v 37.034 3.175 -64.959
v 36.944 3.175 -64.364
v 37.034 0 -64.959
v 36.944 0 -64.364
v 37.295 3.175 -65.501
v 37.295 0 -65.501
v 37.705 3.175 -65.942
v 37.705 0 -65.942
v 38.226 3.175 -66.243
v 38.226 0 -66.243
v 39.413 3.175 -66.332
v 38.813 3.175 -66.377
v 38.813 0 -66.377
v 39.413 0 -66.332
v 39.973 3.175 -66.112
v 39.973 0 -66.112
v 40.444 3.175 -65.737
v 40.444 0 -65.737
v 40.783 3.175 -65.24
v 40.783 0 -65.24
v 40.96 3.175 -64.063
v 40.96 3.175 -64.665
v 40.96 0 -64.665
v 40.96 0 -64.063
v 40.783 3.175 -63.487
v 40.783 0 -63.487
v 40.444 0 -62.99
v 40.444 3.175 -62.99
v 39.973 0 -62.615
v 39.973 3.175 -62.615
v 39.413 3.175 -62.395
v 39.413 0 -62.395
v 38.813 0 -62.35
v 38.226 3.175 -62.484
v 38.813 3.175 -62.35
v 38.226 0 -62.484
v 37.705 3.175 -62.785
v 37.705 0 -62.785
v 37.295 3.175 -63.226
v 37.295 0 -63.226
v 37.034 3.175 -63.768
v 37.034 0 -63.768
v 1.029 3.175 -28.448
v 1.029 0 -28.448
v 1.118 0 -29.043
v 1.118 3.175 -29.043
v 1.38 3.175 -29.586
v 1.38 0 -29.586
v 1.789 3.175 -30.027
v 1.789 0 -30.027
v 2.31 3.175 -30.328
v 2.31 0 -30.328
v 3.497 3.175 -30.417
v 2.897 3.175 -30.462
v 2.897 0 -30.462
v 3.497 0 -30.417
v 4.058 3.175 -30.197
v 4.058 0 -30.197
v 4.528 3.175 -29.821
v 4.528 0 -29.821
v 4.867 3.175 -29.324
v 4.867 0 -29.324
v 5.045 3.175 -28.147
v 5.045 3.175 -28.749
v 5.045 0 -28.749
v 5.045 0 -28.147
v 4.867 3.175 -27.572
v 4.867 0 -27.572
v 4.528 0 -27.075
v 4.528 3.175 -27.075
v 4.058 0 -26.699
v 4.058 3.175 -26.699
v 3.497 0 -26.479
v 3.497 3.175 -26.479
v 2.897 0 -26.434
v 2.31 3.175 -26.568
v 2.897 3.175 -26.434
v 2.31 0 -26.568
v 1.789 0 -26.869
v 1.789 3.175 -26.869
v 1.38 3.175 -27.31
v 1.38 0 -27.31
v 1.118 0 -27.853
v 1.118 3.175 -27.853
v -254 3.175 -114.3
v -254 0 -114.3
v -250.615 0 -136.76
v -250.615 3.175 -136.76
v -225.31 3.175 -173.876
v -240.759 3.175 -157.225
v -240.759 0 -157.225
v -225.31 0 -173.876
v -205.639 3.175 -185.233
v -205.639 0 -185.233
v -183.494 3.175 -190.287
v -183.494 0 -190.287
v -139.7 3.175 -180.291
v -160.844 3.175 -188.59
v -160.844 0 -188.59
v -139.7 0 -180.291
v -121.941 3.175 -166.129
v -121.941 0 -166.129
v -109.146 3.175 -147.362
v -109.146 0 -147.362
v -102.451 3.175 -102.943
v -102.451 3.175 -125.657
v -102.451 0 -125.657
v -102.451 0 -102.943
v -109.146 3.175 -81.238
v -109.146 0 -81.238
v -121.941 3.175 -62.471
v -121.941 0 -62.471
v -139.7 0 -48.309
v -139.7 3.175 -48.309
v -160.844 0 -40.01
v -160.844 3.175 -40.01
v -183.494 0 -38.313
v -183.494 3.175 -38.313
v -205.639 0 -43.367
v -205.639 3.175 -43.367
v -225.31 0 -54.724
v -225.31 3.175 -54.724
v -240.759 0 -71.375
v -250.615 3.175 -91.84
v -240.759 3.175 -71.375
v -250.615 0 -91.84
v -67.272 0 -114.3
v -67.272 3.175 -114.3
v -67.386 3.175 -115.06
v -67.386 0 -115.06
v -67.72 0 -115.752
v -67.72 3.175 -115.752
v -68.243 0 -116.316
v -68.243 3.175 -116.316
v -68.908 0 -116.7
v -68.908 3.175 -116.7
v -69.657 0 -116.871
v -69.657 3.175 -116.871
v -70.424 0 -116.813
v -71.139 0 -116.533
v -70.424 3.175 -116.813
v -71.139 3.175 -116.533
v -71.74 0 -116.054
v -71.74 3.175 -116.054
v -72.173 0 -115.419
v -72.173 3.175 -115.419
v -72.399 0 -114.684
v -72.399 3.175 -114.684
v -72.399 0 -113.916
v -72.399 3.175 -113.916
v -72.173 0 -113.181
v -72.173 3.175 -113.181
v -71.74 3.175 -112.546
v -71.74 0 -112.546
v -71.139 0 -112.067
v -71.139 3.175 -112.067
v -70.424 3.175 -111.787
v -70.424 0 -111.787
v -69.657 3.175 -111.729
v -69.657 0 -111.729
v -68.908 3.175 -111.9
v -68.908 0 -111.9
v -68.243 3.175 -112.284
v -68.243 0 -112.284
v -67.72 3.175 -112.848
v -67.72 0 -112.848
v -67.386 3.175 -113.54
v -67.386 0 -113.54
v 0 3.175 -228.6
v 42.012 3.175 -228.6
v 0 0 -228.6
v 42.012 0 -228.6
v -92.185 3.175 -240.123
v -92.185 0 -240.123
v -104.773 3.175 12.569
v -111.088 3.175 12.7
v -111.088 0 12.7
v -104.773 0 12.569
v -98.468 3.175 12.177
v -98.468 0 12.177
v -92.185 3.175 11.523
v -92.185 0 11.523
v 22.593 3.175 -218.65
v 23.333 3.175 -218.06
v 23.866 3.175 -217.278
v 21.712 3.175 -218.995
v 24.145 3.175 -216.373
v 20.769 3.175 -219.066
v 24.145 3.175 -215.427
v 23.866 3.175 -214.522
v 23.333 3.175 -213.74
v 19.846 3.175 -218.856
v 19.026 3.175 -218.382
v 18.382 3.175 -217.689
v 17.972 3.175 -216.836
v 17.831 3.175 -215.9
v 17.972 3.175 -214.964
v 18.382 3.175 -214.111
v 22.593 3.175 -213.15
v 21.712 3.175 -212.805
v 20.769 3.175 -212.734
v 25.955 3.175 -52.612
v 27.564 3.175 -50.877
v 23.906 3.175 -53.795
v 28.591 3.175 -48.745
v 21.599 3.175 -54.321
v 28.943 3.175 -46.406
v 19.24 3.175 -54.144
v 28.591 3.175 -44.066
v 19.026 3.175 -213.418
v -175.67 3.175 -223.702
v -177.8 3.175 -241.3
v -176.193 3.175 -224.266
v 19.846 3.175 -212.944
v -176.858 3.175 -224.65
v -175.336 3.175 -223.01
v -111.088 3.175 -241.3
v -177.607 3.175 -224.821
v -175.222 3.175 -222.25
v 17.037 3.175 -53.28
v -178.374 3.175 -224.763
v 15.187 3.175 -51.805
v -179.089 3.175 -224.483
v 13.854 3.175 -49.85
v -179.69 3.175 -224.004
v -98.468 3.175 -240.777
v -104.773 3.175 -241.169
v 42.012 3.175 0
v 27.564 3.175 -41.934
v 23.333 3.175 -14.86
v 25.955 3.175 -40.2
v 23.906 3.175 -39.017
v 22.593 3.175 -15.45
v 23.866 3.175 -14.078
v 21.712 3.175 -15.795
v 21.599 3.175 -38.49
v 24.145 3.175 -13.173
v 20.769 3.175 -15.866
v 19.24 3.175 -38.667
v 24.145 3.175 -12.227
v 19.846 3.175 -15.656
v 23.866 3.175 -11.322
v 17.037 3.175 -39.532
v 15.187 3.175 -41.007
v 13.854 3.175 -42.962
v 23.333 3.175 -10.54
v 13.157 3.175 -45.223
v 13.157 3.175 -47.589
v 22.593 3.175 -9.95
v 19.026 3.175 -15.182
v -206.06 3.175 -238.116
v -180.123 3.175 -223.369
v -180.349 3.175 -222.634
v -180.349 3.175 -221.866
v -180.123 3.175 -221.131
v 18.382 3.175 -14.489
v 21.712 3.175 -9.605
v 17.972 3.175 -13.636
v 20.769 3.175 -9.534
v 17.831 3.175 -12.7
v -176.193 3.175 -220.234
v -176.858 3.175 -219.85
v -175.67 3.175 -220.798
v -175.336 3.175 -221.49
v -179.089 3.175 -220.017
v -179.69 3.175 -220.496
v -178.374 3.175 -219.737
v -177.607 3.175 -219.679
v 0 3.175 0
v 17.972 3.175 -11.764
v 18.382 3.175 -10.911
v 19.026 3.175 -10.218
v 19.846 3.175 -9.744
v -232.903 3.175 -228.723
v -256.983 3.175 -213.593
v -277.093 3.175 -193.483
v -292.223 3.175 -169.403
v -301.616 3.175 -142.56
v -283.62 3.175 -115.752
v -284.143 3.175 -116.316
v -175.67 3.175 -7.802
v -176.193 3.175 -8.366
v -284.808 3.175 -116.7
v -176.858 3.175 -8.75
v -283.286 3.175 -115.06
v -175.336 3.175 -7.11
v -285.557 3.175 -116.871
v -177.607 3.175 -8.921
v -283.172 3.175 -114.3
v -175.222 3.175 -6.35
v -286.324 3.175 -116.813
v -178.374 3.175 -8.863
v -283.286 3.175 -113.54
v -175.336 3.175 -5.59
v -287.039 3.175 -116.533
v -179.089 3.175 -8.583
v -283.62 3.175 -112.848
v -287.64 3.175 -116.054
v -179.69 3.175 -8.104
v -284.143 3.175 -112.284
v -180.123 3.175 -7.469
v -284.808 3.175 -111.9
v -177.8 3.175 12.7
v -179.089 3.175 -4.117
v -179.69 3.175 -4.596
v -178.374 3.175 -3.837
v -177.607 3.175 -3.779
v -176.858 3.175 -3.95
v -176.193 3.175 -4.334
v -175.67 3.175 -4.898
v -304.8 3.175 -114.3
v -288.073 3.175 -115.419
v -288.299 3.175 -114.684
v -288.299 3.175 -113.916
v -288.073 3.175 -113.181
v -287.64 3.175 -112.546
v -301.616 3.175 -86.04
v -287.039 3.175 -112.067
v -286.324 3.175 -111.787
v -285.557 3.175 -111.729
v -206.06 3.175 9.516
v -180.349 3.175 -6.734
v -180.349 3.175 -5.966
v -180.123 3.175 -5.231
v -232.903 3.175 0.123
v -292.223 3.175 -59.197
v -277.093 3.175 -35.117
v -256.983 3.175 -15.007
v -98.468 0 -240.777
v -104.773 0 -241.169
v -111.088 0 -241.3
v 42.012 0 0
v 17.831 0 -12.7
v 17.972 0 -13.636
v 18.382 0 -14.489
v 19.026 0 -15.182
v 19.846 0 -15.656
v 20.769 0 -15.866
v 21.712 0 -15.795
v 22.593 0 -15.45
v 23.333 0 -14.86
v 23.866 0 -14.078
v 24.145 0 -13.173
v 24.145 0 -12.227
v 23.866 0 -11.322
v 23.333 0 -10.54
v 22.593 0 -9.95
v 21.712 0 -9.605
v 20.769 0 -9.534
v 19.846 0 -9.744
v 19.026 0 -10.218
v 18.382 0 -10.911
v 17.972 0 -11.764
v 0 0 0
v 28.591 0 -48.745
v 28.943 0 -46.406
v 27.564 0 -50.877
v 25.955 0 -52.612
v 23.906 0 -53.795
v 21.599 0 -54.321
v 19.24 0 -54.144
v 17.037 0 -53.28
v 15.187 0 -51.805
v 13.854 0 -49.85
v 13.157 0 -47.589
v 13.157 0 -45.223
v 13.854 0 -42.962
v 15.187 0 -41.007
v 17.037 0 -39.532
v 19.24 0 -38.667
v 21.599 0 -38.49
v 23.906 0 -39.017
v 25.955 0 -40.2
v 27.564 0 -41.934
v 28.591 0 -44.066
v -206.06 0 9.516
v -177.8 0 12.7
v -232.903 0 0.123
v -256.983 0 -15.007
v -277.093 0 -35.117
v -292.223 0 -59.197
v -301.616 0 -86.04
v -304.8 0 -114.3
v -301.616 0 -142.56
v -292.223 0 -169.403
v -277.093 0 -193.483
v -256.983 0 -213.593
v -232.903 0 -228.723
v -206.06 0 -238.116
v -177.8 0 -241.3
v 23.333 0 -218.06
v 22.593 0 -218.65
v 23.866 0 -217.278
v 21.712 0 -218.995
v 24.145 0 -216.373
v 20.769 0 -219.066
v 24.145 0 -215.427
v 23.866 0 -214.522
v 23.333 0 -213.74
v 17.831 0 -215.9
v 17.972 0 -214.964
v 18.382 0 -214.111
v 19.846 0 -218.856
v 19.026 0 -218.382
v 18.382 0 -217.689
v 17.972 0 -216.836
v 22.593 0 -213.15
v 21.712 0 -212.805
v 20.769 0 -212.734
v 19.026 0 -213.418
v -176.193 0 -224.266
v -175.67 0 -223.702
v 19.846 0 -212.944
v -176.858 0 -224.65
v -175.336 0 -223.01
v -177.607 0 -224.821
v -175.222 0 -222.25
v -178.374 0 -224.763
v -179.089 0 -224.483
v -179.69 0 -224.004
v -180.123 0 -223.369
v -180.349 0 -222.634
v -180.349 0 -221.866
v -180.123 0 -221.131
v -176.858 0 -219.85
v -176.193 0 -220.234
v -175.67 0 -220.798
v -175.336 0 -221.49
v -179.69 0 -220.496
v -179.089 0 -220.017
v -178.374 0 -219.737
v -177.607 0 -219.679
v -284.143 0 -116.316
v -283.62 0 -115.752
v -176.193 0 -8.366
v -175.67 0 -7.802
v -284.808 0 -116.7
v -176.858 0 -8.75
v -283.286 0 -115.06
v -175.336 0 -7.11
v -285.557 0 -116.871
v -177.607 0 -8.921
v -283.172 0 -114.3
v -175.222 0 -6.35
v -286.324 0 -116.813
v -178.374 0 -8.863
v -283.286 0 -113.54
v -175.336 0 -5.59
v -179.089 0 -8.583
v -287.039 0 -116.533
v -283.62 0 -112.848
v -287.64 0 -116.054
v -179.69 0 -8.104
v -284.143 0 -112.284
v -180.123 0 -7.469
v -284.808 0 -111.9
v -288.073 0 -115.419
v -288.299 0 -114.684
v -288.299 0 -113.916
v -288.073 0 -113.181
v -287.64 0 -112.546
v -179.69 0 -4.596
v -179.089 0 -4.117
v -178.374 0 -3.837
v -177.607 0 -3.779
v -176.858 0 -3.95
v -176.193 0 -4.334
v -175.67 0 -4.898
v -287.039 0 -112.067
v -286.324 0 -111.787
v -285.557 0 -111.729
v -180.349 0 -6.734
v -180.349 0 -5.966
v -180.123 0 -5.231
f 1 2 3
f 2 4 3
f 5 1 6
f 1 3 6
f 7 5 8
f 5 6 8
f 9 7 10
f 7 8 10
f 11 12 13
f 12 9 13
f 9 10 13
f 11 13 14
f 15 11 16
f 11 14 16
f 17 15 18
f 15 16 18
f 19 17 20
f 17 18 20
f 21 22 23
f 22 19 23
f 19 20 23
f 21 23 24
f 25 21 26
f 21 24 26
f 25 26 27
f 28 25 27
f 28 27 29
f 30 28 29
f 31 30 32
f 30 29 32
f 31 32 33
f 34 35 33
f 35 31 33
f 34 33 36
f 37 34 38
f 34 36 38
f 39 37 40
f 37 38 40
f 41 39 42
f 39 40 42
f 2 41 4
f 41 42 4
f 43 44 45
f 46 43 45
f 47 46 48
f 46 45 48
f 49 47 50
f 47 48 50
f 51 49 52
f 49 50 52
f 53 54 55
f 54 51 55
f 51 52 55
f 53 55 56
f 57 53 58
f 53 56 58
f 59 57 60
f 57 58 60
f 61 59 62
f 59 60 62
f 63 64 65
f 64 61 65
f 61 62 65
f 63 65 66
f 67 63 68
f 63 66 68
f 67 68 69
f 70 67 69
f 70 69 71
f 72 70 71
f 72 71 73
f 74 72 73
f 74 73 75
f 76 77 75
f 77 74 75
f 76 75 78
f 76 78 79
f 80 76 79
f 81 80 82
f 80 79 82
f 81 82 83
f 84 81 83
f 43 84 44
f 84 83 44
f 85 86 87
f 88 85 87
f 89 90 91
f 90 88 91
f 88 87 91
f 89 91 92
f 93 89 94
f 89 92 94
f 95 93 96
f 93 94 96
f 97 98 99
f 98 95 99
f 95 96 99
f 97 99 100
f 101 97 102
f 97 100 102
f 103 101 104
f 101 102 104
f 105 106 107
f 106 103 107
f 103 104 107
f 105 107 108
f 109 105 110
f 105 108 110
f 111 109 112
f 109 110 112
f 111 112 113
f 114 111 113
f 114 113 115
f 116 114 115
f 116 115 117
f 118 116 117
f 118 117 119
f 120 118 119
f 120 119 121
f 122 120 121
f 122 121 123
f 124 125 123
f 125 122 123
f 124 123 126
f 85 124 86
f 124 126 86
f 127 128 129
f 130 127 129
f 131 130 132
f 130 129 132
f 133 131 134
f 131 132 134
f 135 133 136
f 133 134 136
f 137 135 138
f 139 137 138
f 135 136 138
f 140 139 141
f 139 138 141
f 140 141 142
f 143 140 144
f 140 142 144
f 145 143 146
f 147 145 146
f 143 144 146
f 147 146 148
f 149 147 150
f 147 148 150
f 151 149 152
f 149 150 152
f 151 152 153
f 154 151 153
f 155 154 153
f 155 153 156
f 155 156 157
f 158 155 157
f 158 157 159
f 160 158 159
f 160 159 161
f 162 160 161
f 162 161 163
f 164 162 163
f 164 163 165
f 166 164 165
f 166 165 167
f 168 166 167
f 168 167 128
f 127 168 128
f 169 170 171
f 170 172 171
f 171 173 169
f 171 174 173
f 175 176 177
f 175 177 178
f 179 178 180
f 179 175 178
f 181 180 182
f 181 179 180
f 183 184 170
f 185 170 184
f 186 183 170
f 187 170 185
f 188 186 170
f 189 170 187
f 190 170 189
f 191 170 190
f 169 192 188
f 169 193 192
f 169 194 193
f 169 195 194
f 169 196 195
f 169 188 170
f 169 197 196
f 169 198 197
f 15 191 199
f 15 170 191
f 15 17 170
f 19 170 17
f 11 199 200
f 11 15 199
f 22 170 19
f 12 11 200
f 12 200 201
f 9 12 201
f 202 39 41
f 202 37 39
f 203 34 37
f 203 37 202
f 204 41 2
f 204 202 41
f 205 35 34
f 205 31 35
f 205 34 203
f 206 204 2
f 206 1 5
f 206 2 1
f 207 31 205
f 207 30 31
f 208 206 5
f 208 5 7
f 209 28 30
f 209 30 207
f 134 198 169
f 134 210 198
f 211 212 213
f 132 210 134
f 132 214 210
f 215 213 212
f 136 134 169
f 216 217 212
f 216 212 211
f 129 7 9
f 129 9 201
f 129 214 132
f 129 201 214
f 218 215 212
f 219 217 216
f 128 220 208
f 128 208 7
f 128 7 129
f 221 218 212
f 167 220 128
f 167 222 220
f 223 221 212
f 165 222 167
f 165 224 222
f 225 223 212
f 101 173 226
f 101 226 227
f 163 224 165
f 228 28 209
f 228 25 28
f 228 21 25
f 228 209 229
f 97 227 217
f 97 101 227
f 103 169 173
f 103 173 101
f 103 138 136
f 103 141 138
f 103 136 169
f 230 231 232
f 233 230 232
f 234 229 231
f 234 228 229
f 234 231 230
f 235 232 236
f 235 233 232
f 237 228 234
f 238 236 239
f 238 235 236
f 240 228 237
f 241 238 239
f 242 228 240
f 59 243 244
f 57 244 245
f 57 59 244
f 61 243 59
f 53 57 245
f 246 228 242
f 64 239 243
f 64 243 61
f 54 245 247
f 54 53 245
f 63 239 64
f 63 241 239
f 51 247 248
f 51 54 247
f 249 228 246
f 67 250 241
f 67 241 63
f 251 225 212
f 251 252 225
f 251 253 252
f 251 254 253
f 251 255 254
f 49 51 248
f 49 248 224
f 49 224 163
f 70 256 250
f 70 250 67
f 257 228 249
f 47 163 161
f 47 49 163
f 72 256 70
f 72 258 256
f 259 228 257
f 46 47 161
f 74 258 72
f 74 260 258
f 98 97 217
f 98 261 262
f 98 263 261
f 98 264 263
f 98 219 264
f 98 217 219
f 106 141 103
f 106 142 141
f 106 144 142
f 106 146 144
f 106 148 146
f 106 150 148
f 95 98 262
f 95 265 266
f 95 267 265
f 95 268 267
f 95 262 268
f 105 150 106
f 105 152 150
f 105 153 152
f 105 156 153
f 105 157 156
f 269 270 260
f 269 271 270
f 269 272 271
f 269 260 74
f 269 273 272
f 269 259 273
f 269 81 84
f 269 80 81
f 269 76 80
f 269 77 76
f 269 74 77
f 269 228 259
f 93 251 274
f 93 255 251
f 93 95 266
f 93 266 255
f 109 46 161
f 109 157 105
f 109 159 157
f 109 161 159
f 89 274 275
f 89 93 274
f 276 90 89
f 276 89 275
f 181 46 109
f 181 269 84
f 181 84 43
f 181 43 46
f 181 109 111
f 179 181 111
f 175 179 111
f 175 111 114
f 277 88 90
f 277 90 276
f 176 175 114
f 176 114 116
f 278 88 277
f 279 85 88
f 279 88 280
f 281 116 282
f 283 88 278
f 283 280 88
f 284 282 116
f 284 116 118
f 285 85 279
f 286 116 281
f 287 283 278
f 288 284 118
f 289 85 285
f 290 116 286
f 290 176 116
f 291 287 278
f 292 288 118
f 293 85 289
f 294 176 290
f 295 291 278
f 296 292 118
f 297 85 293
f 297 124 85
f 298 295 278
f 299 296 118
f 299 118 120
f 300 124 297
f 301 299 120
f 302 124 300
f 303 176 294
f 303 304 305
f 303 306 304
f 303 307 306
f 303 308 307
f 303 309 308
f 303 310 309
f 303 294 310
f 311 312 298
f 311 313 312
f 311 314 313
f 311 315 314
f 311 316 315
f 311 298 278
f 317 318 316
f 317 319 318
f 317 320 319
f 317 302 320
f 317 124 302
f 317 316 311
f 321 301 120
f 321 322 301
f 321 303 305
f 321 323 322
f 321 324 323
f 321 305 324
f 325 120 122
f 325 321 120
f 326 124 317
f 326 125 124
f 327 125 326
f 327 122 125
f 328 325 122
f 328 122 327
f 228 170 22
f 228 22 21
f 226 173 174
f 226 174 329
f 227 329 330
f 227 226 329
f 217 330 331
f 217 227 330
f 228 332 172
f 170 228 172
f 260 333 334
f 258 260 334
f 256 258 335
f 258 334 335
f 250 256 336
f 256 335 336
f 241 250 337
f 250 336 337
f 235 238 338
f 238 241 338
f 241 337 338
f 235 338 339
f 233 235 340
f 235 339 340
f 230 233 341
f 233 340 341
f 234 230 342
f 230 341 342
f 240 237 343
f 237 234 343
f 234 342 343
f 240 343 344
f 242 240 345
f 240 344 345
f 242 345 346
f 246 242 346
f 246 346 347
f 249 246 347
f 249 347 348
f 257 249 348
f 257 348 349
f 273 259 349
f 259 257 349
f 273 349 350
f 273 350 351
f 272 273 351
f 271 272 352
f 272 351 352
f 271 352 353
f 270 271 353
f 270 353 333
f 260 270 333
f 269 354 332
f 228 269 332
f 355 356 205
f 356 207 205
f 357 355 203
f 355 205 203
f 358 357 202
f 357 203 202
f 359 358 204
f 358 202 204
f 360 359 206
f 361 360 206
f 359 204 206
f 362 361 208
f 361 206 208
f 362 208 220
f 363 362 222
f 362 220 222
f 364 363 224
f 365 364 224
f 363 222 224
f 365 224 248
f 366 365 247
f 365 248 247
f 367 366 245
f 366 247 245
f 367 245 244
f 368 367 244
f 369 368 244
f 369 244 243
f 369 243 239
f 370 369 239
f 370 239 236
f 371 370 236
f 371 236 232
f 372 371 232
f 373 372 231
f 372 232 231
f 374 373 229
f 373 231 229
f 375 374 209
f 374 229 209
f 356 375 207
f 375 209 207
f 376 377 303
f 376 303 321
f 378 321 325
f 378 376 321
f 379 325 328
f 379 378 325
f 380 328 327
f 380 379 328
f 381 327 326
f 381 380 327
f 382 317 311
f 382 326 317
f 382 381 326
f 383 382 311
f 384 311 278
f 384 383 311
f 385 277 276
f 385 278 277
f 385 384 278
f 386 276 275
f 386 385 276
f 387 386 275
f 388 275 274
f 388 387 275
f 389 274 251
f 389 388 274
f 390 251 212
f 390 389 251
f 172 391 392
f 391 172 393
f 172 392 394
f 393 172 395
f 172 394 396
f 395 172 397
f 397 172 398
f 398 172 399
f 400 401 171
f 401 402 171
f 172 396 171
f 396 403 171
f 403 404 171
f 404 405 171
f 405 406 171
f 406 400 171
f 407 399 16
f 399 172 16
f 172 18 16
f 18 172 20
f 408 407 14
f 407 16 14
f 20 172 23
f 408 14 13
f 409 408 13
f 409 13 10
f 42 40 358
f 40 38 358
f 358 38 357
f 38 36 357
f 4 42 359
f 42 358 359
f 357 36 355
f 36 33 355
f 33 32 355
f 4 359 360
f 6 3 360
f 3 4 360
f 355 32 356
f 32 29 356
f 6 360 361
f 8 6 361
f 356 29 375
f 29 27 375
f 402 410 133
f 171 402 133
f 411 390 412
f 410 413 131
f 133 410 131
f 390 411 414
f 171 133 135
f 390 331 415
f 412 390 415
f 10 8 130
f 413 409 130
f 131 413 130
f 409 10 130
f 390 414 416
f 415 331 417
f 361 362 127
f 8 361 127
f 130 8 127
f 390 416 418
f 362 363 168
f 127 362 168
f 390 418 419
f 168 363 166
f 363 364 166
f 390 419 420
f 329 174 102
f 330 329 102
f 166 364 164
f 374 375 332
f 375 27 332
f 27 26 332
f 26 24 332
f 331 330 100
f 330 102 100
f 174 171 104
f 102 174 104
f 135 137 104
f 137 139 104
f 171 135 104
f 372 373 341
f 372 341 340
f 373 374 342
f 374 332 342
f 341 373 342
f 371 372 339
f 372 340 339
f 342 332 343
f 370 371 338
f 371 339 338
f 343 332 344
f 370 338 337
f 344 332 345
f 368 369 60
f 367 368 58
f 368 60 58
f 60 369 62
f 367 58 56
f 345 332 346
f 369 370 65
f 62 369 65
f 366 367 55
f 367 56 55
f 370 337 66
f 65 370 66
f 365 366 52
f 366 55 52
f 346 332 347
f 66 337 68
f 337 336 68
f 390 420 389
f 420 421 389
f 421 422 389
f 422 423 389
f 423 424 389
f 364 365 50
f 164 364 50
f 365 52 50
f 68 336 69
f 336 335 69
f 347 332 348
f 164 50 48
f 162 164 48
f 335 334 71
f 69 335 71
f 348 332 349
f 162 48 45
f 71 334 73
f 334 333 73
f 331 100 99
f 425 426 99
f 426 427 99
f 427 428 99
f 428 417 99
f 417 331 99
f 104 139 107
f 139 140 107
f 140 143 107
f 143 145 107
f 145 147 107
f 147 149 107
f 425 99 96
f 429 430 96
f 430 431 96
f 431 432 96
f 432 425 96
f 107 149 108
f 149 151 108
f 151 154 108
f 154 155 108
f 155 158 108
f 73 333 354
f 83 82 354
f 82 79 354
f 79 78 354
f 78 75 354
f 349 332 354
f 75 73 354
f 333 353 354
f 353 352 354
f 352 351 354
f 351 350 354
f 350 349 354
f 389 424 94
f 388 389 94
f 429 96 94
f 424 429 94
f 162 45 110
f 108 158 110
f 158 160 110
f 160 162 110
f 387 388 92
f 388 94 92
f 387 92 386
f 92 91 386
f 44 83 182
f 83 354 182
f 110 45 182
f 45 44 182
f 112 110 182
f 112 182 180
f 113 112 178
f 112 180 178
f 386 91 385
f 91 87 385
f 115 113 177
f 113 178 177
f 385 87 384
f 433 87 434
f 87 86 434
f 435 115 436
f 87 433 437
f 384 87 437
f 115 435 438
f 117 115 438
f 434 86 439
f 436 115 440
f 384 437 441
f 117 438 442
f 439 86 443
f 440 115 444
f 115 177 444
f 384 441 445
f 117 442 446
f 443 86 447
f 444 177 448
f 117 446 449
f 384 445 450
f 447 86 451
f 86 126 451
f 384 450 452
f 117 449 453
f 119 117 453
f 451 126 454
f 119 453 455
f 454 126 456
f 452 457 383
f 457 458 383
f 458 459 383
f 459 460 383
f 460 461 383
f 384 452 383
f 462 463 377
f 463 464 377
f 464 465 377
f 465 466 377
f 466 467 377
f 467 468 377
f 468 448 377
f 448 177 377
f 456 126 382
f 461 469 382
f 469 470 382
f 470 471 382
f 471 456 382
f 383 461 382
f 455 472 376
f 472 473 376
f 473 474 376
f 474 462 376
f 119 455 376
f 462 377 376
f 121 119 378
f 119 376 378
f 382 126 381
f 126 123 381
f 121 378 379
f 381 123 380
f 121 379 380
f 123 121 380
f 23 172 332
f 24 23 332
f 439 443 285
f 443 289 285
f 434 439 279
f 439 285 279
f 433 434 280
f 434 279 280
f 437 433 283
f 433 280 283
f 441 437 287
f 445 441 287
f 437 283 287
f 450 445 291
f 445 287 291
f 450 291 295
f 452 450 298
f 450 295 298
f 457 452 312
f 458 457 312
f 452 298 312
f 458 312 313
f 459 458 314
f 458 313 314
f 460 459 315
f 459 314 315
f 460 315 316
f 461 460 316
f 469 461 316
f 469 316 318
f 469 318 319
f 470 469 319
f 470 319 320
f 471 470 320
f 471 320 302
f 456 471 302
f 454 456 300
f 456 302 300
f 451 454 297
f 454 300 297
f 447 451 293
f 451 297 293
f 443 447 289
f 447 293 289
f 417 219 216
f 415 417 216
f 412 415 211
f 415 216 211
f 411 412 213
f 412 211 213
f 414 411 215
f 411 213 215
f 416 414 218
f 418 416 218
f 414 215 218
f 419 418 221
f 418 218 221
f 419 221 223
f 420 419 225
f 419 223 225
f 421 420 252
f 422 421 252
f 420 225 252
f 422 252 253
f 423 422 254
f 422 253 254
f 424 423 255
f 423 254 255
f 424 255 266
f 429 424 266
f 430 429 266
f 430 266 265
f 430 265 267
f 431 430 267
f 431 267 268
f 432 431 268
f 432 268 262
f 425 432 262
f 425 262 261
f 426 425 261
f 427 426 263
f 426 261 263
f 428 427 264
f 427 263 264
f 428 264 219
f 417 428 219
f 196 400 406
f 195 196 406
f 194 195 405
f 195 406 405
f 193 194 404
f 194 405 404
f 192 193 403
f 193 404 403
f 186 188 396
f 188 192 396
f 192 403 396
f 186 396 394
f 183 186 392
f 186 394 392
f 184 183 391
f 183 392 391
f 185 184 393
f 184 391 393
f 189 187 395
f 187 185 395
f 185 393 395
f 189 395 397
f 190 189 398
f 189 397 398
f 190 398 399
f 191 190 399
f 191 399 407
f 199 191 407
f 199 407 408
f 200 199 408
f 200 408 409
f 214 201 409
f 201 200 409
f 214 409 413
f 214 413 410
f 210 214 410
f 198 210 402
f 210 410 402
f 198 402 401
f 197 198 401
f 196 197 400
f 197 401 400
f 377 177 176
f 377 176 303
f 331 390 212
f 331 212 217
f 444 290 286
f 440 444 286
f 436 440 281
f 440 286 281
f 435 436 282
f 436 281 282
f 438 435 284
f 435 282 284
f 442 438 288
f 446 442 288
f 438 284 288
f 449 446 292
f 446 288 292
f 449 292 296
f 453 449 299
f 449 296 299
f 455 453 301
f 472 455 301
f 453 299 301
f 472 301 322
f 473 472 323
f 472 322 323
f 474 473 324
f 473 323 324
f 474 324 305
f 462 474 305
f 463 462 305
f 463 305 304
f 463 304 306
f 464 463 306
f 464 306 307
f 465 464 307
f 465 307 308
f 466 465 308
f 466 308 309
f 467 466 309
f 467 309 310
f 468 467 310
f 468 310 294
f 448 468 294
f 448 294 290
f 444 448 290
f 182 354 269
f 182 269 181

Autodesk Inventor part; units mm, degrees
ref_plane "YZ Plane" through (0, 0, 0) normal (1, 0, 0) x (0, 1, 0)
ref_plane "XZ Plane" through (0, 0, 0) normal (0, 1, 0) x (-1, 0, 0)
ref_plane "XY Plane" through (0, 0, 0) normal (0, 0, 1) x (1, 0, 0)
sketch "Sketch1" plane through (0, 0, 0) normal (0, 1, 0) x (-1, 0, 0)
  line L0 (0, 0) -> (-42.0116, 0)
  line L1 (-42.0116, 0) -> (-42.0116, -228.6)
  line L2 (-42.0116, -228.6) -> (0, -228.6)
  line L3 (0, -228.6) -> (0, 0)
  circle A0 centre (-21.0058, -12.7) radius 3.175
  circle A1 centre (-21.0058, -215.9) radius 3.175
  circle A2 centre (-3.048, -28.448) radius 2.0193
  circle A3 centre (-38.9636, -64.3636) radius 2.0193
  line L4 (0, 0) -> (101.6, 12.7)
  line L5 (101.6, 12.7) -> (177.8, 12.7)
  line L6 (304.8, -114.3) -> (304.8, -114.3)
  line L7 (177.8, -241.3) -> (101.6, -241.3)
  line L8 (101.6, -241.3) -> (0, -228.6)
  circle A4 centre (177.8, -114.3) radius 76.2
  arc A5 (304.8, -114.3) -> (177.8, 12.7) centre (177.8, -114.3) ccw
  arc A6 (177.8, -241.3) -> (304.8, -114.3) centre (177.8, -114.3) ccw
  point P0 (304.8, 12.7)
  point P1 (304.8, -241.3)
  dimension "d0" = 42.0116
  dimension "d1" = 228.6
  dimension "d2" = 12.7
  dimension "d3" = 12.7
  dimension "d4" = 6.35
  dimension "d5" = 21.0058
  dimension "d6" = 21.0058
  dimension "d7" = 6.35
  dimension "d8" = 28.448
  dimension "d9" = 3.048
  dimension "d10" = 4.0386
  dimension "d11" = 4.0386
  dimension "d12" = 64.3636
  dimension "d13" = 3.048
  dimension "d21" = 152.4
  dimension "d22" = 254
  dimension "d23" = 203.2
  dimension "d24" = 101.6
  dimension "d25" = 127
  dimension "d26" = 127
  dimension "d27" = 127
  dimension "d28" = 127
extrude "Extrusion1" add sketch "Sketch1" along normal blind 3.175
sketch "Sketch2" plane through (0, 3.175, 0) normal (0, 1, 0) x (1, 0, 0)
  circle A0 centre (21.0058, 46.4058) radius 7.9375
  line L0 (0, 228.6) -> (0, 0) projected
  line L1 (0, 0) -> (42.0116, 0) projected
  line L2 (42.0116, 228.6) -> (0, 228.6) projected
  line L3 (0, 0) -> (0, 228.6)
  line L4 (42.0116, 0) -> (42.0116, 228.6) projected
  dimension "d16" = 15.875
  dimension "d18" = 46.4058
  dimension "d31" = 21.0058
extrude "Extrusion2" cut sketch "Sketch2" against normal blind 7.9375 contours A0
fillet "Fillet1" radius 152.4 2 edges at (-101.6, 1.5875, 12.7) (-101.6, 1.5875, -241.3)
sketch "Sketch3" plane through (0, 3.175, 0) normal (0, 1, 0) x (1, 0, 0)
  circle A0 centre (-177.8, 114.3) radius 107.95 construction
  circle A1 centre (-177.8, 114.3) radius 76.2 projected
  circle A2 centre (-177.8, 6.35) radius 2.5781
  circle A3 centre (-69.85, 114.3) radius 2.5781
  circle A4 centre (-177.8, 222.25) radius 2.5781
  circle A5 centre (-285.75, 114.3) radius 2.5781
  line L0 (-177.8, 114.3) -> (-177.8, 6.35) construction
  line L1 (-177.8, 114.3) -> (-69.85, 114.3) construction
  line L2 (-177.8, 114.3) -> (-177.8, 222.25) construction
  line L3 (-177.8, 114.3) -> (-285.75, 114.3) construction
  point P0 (0, 0)
  dimension "d33" = 215.9
  dimension "d35" = 90
  dimension "d43" = 90
  dimension "d44" = 90
extrude "Extrusion3" cut sketch "Sketch3" against normal blind 25.4 contours A2 | A3 | A4 | A5
properties part number "BAG motor top plate" material "Aluminum 6061"
